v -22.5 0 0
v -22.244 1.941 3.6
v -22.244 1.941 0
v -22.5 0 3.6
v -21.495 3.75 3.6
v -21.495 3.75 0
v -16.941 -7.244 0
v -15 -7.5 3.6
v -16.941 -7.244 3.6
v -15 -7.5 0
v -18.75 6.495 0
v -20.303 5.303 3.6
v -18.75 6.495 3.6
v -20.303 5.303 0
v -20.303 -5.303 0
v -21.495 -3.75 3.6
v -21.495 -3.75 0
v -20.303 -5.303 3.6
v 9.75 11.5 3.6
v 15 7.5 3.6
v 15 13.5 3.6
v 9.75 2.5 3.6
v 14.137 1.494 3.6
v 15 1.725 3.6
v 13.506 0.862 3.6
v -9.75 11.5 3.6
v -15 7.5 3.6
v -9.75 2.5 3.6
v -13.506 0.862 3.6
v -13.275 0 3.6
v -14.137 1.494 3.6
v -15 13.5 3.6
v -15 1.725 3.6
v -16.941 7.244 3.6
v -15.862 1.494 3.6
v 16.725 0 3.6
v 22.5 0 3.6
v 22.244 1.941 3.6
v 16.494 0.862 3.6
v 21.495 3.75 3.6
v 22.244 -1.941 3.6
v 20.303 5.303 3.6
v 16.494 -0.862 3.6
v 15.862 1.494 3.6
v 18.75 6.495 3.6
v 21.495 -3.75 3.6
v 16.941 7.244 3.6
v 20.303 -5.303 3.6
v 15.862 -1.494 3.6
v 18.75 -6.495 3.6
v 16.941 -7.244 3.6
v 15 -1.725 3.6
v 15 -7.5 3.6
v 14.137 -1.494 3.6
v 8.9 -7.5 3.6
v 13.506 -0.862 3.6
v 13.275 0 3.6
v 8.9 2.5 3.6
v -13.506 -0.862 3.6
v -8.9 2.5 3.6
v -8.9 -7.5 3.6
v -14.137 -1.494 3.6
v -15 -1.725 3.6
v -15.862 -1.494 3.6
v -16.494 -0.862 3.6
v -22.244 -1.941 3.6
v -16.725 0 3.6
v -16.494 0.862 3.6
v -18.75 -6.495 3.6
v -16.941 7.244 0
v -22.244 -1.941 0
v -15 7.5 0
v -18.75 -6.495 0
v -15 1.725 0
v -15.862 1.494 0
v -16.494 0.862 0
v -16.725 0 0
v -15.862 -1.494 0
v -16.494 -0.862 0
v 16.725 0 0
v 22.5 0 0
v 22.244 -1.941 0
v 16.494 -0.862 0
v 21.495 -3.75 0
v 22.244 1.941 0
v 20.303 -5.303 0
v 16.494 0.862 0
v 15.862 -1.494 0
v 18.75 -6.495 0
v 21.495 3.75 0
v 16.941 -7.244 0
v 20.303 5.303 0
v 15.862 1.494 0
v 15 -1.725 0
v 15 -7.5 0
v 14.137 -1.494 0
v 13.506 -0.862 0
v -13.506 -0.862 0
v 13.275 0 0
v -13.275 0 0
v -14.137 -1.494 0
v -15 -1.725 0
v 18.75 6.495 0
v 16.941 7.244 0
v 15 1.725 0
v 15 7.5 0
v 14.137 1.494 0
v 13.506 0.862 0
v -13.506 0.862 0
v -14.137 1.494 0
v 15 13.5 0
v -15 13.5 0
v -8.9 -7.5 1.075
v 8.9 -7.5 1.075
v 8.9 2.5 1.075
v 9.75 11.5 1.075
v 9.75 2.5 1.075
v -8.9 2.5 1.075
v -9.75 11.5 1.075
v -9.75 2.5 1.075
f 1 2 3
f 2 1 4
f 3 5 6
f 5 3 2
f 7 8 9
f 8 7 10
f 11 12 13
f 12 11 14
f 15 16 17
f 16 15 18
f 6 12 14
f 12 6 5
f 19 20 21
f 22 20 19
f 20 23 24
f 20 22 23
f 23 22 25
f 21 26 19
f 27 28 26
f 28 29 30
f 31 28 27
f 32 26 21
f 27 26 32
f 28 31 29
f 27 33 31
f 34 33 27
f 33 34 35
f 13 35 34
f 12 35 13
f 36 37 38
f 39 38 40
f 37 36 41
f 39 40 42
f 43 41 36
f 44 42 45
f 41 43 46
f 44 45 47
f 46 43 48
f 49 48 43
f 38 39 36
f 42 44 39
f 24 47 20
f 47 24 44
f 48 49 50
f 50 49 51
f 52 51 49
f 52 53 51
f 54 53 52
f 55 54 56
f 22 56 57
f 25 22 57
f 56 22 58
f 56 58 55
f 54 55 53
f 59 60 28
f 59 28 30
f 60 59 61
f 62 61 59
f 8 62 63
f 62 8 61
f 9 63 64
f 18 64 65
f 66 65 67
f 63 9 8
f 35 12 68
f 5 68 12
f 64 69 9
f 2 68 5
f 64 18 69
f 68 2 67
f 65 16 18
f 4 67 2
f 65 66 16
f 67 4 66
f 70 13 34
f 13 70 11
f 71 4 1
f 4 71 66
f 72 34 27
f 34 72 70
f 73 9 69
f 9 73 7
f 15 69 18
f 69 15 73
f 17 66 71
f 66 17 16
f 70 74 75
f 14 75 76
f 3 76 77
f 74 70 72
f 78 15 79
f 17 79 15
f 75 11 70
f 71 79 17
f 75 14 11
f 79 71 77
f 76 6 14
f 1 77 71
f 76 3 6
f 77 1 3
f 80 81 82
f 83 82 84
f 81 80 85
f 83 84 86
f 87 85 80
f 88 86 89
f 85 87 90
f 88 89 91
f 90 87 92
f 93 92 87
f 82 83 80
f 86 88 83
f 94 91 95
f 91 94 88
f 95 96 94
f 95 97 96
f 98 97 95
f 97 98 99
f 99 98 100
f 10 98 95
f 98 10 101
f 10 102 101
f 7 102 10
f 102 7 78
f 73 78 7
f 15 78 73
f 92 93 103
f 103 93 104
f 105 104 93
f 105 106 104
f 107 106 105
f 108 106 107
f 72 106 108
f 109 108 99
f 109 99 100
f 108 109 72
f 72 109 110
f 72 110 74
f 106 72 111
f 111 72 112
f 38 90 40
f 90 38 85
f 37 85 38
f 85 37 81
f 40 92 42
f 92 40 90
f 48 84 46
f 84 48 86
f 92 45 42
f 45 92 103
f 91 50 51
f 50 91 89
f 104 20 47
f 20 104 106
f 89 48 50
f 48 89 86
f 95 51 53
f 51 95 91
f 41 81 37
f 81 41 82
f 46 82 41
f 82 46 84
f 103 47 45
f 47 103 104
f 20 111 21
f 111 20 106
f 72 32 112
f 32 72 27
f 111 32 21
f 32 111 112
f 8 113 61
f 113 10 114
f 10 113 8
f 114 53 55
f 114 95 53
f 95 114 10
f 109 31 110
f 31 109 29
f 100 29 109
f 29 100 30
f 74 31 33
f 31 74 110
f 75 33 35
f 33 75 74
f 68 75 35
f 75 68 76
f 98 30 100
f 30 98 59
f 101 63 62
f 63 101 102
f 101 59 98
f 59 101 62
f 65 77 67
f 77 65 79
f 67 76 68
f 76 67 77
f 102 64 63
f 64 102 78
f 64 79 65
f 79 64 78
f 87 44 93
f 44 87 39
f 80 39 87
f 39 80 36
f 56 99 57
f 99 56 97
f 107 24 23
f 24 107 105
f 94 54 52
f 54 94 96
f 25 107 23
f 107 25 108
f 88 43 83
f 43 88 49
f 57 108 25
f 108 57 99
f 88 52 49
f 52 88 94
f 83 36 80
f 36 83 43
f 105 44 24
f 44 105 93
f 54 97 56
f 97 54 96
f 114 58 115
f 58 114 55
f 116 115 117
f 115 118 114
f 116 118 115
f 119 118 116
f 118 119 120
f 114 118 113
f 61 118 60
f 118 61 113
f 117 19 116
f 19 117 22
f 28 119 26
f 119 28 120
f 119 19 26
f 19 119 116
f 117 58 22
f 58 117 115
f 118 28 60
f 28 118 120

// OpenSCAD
// file: ../include/configuration.scad
// Increase this if your slicer or printer make holes too tight.
extra_radius = 0.1;

// OD = outside diameter, corner to corner.
m3_nut_od = 6.1;
m3_nut_radius = m3_nut_od/2 + 0.2 + extra_radius;
m3_washer_radius = 3.5 + extra_radius;

// Major diameter of metric 3mm thread.
m3_major = 2.85;
m3_radius = m3_major/2 + extra_radius;
m3_wide_radius = m3_major/2 + extra_radius + 0.2;

// NEMA17 stepper motors.
motor_shaft_diameter = 5;
motor_shaft_radius = motor_shaft_diameter/2 + extra_radius;

// Frame brackets. M3x8mm screws work best with 3.6 mm brackets.
thickness = 3.6;

// OpenBeam or Misumi. Currently only 15x15 mm, but there is a plan
// to make models more parametric and allow 20x20 mm in the future.
extrusion = 15;

// Placement for the NEMA17 stepper motors.
motor_offset = 44;
motor_length = 47;
// main file
include <../include/configuration.scad>;

radius = 7.5;

difference() {
  union() {
    for (x = [-2*radius, 2*radius]) {
      translate([x, 0, thickness/2])
        cylinder(r=radius, h=thickness, center=true, $fn=24);
    }
    translate([0, 3, thickness/2])
      cube([4*radius, 2*radius+6, thickness], center=true);
  }
  for (x = [-2*radius, 2*radius]) {
    translate([x, 0, 0]) #
      cylinder(r=m3_wide_radius, h=20, center=true, $fn=12);
  }
  translate([0, -5, 7.5]) #
    cube([17.6+2*extra_radius, 20, 12.85], center=true);
  translate([0, 7, 7.5]) #
    cube([19.3+2*extra_radius, 9, 12.85], center=true);
}
